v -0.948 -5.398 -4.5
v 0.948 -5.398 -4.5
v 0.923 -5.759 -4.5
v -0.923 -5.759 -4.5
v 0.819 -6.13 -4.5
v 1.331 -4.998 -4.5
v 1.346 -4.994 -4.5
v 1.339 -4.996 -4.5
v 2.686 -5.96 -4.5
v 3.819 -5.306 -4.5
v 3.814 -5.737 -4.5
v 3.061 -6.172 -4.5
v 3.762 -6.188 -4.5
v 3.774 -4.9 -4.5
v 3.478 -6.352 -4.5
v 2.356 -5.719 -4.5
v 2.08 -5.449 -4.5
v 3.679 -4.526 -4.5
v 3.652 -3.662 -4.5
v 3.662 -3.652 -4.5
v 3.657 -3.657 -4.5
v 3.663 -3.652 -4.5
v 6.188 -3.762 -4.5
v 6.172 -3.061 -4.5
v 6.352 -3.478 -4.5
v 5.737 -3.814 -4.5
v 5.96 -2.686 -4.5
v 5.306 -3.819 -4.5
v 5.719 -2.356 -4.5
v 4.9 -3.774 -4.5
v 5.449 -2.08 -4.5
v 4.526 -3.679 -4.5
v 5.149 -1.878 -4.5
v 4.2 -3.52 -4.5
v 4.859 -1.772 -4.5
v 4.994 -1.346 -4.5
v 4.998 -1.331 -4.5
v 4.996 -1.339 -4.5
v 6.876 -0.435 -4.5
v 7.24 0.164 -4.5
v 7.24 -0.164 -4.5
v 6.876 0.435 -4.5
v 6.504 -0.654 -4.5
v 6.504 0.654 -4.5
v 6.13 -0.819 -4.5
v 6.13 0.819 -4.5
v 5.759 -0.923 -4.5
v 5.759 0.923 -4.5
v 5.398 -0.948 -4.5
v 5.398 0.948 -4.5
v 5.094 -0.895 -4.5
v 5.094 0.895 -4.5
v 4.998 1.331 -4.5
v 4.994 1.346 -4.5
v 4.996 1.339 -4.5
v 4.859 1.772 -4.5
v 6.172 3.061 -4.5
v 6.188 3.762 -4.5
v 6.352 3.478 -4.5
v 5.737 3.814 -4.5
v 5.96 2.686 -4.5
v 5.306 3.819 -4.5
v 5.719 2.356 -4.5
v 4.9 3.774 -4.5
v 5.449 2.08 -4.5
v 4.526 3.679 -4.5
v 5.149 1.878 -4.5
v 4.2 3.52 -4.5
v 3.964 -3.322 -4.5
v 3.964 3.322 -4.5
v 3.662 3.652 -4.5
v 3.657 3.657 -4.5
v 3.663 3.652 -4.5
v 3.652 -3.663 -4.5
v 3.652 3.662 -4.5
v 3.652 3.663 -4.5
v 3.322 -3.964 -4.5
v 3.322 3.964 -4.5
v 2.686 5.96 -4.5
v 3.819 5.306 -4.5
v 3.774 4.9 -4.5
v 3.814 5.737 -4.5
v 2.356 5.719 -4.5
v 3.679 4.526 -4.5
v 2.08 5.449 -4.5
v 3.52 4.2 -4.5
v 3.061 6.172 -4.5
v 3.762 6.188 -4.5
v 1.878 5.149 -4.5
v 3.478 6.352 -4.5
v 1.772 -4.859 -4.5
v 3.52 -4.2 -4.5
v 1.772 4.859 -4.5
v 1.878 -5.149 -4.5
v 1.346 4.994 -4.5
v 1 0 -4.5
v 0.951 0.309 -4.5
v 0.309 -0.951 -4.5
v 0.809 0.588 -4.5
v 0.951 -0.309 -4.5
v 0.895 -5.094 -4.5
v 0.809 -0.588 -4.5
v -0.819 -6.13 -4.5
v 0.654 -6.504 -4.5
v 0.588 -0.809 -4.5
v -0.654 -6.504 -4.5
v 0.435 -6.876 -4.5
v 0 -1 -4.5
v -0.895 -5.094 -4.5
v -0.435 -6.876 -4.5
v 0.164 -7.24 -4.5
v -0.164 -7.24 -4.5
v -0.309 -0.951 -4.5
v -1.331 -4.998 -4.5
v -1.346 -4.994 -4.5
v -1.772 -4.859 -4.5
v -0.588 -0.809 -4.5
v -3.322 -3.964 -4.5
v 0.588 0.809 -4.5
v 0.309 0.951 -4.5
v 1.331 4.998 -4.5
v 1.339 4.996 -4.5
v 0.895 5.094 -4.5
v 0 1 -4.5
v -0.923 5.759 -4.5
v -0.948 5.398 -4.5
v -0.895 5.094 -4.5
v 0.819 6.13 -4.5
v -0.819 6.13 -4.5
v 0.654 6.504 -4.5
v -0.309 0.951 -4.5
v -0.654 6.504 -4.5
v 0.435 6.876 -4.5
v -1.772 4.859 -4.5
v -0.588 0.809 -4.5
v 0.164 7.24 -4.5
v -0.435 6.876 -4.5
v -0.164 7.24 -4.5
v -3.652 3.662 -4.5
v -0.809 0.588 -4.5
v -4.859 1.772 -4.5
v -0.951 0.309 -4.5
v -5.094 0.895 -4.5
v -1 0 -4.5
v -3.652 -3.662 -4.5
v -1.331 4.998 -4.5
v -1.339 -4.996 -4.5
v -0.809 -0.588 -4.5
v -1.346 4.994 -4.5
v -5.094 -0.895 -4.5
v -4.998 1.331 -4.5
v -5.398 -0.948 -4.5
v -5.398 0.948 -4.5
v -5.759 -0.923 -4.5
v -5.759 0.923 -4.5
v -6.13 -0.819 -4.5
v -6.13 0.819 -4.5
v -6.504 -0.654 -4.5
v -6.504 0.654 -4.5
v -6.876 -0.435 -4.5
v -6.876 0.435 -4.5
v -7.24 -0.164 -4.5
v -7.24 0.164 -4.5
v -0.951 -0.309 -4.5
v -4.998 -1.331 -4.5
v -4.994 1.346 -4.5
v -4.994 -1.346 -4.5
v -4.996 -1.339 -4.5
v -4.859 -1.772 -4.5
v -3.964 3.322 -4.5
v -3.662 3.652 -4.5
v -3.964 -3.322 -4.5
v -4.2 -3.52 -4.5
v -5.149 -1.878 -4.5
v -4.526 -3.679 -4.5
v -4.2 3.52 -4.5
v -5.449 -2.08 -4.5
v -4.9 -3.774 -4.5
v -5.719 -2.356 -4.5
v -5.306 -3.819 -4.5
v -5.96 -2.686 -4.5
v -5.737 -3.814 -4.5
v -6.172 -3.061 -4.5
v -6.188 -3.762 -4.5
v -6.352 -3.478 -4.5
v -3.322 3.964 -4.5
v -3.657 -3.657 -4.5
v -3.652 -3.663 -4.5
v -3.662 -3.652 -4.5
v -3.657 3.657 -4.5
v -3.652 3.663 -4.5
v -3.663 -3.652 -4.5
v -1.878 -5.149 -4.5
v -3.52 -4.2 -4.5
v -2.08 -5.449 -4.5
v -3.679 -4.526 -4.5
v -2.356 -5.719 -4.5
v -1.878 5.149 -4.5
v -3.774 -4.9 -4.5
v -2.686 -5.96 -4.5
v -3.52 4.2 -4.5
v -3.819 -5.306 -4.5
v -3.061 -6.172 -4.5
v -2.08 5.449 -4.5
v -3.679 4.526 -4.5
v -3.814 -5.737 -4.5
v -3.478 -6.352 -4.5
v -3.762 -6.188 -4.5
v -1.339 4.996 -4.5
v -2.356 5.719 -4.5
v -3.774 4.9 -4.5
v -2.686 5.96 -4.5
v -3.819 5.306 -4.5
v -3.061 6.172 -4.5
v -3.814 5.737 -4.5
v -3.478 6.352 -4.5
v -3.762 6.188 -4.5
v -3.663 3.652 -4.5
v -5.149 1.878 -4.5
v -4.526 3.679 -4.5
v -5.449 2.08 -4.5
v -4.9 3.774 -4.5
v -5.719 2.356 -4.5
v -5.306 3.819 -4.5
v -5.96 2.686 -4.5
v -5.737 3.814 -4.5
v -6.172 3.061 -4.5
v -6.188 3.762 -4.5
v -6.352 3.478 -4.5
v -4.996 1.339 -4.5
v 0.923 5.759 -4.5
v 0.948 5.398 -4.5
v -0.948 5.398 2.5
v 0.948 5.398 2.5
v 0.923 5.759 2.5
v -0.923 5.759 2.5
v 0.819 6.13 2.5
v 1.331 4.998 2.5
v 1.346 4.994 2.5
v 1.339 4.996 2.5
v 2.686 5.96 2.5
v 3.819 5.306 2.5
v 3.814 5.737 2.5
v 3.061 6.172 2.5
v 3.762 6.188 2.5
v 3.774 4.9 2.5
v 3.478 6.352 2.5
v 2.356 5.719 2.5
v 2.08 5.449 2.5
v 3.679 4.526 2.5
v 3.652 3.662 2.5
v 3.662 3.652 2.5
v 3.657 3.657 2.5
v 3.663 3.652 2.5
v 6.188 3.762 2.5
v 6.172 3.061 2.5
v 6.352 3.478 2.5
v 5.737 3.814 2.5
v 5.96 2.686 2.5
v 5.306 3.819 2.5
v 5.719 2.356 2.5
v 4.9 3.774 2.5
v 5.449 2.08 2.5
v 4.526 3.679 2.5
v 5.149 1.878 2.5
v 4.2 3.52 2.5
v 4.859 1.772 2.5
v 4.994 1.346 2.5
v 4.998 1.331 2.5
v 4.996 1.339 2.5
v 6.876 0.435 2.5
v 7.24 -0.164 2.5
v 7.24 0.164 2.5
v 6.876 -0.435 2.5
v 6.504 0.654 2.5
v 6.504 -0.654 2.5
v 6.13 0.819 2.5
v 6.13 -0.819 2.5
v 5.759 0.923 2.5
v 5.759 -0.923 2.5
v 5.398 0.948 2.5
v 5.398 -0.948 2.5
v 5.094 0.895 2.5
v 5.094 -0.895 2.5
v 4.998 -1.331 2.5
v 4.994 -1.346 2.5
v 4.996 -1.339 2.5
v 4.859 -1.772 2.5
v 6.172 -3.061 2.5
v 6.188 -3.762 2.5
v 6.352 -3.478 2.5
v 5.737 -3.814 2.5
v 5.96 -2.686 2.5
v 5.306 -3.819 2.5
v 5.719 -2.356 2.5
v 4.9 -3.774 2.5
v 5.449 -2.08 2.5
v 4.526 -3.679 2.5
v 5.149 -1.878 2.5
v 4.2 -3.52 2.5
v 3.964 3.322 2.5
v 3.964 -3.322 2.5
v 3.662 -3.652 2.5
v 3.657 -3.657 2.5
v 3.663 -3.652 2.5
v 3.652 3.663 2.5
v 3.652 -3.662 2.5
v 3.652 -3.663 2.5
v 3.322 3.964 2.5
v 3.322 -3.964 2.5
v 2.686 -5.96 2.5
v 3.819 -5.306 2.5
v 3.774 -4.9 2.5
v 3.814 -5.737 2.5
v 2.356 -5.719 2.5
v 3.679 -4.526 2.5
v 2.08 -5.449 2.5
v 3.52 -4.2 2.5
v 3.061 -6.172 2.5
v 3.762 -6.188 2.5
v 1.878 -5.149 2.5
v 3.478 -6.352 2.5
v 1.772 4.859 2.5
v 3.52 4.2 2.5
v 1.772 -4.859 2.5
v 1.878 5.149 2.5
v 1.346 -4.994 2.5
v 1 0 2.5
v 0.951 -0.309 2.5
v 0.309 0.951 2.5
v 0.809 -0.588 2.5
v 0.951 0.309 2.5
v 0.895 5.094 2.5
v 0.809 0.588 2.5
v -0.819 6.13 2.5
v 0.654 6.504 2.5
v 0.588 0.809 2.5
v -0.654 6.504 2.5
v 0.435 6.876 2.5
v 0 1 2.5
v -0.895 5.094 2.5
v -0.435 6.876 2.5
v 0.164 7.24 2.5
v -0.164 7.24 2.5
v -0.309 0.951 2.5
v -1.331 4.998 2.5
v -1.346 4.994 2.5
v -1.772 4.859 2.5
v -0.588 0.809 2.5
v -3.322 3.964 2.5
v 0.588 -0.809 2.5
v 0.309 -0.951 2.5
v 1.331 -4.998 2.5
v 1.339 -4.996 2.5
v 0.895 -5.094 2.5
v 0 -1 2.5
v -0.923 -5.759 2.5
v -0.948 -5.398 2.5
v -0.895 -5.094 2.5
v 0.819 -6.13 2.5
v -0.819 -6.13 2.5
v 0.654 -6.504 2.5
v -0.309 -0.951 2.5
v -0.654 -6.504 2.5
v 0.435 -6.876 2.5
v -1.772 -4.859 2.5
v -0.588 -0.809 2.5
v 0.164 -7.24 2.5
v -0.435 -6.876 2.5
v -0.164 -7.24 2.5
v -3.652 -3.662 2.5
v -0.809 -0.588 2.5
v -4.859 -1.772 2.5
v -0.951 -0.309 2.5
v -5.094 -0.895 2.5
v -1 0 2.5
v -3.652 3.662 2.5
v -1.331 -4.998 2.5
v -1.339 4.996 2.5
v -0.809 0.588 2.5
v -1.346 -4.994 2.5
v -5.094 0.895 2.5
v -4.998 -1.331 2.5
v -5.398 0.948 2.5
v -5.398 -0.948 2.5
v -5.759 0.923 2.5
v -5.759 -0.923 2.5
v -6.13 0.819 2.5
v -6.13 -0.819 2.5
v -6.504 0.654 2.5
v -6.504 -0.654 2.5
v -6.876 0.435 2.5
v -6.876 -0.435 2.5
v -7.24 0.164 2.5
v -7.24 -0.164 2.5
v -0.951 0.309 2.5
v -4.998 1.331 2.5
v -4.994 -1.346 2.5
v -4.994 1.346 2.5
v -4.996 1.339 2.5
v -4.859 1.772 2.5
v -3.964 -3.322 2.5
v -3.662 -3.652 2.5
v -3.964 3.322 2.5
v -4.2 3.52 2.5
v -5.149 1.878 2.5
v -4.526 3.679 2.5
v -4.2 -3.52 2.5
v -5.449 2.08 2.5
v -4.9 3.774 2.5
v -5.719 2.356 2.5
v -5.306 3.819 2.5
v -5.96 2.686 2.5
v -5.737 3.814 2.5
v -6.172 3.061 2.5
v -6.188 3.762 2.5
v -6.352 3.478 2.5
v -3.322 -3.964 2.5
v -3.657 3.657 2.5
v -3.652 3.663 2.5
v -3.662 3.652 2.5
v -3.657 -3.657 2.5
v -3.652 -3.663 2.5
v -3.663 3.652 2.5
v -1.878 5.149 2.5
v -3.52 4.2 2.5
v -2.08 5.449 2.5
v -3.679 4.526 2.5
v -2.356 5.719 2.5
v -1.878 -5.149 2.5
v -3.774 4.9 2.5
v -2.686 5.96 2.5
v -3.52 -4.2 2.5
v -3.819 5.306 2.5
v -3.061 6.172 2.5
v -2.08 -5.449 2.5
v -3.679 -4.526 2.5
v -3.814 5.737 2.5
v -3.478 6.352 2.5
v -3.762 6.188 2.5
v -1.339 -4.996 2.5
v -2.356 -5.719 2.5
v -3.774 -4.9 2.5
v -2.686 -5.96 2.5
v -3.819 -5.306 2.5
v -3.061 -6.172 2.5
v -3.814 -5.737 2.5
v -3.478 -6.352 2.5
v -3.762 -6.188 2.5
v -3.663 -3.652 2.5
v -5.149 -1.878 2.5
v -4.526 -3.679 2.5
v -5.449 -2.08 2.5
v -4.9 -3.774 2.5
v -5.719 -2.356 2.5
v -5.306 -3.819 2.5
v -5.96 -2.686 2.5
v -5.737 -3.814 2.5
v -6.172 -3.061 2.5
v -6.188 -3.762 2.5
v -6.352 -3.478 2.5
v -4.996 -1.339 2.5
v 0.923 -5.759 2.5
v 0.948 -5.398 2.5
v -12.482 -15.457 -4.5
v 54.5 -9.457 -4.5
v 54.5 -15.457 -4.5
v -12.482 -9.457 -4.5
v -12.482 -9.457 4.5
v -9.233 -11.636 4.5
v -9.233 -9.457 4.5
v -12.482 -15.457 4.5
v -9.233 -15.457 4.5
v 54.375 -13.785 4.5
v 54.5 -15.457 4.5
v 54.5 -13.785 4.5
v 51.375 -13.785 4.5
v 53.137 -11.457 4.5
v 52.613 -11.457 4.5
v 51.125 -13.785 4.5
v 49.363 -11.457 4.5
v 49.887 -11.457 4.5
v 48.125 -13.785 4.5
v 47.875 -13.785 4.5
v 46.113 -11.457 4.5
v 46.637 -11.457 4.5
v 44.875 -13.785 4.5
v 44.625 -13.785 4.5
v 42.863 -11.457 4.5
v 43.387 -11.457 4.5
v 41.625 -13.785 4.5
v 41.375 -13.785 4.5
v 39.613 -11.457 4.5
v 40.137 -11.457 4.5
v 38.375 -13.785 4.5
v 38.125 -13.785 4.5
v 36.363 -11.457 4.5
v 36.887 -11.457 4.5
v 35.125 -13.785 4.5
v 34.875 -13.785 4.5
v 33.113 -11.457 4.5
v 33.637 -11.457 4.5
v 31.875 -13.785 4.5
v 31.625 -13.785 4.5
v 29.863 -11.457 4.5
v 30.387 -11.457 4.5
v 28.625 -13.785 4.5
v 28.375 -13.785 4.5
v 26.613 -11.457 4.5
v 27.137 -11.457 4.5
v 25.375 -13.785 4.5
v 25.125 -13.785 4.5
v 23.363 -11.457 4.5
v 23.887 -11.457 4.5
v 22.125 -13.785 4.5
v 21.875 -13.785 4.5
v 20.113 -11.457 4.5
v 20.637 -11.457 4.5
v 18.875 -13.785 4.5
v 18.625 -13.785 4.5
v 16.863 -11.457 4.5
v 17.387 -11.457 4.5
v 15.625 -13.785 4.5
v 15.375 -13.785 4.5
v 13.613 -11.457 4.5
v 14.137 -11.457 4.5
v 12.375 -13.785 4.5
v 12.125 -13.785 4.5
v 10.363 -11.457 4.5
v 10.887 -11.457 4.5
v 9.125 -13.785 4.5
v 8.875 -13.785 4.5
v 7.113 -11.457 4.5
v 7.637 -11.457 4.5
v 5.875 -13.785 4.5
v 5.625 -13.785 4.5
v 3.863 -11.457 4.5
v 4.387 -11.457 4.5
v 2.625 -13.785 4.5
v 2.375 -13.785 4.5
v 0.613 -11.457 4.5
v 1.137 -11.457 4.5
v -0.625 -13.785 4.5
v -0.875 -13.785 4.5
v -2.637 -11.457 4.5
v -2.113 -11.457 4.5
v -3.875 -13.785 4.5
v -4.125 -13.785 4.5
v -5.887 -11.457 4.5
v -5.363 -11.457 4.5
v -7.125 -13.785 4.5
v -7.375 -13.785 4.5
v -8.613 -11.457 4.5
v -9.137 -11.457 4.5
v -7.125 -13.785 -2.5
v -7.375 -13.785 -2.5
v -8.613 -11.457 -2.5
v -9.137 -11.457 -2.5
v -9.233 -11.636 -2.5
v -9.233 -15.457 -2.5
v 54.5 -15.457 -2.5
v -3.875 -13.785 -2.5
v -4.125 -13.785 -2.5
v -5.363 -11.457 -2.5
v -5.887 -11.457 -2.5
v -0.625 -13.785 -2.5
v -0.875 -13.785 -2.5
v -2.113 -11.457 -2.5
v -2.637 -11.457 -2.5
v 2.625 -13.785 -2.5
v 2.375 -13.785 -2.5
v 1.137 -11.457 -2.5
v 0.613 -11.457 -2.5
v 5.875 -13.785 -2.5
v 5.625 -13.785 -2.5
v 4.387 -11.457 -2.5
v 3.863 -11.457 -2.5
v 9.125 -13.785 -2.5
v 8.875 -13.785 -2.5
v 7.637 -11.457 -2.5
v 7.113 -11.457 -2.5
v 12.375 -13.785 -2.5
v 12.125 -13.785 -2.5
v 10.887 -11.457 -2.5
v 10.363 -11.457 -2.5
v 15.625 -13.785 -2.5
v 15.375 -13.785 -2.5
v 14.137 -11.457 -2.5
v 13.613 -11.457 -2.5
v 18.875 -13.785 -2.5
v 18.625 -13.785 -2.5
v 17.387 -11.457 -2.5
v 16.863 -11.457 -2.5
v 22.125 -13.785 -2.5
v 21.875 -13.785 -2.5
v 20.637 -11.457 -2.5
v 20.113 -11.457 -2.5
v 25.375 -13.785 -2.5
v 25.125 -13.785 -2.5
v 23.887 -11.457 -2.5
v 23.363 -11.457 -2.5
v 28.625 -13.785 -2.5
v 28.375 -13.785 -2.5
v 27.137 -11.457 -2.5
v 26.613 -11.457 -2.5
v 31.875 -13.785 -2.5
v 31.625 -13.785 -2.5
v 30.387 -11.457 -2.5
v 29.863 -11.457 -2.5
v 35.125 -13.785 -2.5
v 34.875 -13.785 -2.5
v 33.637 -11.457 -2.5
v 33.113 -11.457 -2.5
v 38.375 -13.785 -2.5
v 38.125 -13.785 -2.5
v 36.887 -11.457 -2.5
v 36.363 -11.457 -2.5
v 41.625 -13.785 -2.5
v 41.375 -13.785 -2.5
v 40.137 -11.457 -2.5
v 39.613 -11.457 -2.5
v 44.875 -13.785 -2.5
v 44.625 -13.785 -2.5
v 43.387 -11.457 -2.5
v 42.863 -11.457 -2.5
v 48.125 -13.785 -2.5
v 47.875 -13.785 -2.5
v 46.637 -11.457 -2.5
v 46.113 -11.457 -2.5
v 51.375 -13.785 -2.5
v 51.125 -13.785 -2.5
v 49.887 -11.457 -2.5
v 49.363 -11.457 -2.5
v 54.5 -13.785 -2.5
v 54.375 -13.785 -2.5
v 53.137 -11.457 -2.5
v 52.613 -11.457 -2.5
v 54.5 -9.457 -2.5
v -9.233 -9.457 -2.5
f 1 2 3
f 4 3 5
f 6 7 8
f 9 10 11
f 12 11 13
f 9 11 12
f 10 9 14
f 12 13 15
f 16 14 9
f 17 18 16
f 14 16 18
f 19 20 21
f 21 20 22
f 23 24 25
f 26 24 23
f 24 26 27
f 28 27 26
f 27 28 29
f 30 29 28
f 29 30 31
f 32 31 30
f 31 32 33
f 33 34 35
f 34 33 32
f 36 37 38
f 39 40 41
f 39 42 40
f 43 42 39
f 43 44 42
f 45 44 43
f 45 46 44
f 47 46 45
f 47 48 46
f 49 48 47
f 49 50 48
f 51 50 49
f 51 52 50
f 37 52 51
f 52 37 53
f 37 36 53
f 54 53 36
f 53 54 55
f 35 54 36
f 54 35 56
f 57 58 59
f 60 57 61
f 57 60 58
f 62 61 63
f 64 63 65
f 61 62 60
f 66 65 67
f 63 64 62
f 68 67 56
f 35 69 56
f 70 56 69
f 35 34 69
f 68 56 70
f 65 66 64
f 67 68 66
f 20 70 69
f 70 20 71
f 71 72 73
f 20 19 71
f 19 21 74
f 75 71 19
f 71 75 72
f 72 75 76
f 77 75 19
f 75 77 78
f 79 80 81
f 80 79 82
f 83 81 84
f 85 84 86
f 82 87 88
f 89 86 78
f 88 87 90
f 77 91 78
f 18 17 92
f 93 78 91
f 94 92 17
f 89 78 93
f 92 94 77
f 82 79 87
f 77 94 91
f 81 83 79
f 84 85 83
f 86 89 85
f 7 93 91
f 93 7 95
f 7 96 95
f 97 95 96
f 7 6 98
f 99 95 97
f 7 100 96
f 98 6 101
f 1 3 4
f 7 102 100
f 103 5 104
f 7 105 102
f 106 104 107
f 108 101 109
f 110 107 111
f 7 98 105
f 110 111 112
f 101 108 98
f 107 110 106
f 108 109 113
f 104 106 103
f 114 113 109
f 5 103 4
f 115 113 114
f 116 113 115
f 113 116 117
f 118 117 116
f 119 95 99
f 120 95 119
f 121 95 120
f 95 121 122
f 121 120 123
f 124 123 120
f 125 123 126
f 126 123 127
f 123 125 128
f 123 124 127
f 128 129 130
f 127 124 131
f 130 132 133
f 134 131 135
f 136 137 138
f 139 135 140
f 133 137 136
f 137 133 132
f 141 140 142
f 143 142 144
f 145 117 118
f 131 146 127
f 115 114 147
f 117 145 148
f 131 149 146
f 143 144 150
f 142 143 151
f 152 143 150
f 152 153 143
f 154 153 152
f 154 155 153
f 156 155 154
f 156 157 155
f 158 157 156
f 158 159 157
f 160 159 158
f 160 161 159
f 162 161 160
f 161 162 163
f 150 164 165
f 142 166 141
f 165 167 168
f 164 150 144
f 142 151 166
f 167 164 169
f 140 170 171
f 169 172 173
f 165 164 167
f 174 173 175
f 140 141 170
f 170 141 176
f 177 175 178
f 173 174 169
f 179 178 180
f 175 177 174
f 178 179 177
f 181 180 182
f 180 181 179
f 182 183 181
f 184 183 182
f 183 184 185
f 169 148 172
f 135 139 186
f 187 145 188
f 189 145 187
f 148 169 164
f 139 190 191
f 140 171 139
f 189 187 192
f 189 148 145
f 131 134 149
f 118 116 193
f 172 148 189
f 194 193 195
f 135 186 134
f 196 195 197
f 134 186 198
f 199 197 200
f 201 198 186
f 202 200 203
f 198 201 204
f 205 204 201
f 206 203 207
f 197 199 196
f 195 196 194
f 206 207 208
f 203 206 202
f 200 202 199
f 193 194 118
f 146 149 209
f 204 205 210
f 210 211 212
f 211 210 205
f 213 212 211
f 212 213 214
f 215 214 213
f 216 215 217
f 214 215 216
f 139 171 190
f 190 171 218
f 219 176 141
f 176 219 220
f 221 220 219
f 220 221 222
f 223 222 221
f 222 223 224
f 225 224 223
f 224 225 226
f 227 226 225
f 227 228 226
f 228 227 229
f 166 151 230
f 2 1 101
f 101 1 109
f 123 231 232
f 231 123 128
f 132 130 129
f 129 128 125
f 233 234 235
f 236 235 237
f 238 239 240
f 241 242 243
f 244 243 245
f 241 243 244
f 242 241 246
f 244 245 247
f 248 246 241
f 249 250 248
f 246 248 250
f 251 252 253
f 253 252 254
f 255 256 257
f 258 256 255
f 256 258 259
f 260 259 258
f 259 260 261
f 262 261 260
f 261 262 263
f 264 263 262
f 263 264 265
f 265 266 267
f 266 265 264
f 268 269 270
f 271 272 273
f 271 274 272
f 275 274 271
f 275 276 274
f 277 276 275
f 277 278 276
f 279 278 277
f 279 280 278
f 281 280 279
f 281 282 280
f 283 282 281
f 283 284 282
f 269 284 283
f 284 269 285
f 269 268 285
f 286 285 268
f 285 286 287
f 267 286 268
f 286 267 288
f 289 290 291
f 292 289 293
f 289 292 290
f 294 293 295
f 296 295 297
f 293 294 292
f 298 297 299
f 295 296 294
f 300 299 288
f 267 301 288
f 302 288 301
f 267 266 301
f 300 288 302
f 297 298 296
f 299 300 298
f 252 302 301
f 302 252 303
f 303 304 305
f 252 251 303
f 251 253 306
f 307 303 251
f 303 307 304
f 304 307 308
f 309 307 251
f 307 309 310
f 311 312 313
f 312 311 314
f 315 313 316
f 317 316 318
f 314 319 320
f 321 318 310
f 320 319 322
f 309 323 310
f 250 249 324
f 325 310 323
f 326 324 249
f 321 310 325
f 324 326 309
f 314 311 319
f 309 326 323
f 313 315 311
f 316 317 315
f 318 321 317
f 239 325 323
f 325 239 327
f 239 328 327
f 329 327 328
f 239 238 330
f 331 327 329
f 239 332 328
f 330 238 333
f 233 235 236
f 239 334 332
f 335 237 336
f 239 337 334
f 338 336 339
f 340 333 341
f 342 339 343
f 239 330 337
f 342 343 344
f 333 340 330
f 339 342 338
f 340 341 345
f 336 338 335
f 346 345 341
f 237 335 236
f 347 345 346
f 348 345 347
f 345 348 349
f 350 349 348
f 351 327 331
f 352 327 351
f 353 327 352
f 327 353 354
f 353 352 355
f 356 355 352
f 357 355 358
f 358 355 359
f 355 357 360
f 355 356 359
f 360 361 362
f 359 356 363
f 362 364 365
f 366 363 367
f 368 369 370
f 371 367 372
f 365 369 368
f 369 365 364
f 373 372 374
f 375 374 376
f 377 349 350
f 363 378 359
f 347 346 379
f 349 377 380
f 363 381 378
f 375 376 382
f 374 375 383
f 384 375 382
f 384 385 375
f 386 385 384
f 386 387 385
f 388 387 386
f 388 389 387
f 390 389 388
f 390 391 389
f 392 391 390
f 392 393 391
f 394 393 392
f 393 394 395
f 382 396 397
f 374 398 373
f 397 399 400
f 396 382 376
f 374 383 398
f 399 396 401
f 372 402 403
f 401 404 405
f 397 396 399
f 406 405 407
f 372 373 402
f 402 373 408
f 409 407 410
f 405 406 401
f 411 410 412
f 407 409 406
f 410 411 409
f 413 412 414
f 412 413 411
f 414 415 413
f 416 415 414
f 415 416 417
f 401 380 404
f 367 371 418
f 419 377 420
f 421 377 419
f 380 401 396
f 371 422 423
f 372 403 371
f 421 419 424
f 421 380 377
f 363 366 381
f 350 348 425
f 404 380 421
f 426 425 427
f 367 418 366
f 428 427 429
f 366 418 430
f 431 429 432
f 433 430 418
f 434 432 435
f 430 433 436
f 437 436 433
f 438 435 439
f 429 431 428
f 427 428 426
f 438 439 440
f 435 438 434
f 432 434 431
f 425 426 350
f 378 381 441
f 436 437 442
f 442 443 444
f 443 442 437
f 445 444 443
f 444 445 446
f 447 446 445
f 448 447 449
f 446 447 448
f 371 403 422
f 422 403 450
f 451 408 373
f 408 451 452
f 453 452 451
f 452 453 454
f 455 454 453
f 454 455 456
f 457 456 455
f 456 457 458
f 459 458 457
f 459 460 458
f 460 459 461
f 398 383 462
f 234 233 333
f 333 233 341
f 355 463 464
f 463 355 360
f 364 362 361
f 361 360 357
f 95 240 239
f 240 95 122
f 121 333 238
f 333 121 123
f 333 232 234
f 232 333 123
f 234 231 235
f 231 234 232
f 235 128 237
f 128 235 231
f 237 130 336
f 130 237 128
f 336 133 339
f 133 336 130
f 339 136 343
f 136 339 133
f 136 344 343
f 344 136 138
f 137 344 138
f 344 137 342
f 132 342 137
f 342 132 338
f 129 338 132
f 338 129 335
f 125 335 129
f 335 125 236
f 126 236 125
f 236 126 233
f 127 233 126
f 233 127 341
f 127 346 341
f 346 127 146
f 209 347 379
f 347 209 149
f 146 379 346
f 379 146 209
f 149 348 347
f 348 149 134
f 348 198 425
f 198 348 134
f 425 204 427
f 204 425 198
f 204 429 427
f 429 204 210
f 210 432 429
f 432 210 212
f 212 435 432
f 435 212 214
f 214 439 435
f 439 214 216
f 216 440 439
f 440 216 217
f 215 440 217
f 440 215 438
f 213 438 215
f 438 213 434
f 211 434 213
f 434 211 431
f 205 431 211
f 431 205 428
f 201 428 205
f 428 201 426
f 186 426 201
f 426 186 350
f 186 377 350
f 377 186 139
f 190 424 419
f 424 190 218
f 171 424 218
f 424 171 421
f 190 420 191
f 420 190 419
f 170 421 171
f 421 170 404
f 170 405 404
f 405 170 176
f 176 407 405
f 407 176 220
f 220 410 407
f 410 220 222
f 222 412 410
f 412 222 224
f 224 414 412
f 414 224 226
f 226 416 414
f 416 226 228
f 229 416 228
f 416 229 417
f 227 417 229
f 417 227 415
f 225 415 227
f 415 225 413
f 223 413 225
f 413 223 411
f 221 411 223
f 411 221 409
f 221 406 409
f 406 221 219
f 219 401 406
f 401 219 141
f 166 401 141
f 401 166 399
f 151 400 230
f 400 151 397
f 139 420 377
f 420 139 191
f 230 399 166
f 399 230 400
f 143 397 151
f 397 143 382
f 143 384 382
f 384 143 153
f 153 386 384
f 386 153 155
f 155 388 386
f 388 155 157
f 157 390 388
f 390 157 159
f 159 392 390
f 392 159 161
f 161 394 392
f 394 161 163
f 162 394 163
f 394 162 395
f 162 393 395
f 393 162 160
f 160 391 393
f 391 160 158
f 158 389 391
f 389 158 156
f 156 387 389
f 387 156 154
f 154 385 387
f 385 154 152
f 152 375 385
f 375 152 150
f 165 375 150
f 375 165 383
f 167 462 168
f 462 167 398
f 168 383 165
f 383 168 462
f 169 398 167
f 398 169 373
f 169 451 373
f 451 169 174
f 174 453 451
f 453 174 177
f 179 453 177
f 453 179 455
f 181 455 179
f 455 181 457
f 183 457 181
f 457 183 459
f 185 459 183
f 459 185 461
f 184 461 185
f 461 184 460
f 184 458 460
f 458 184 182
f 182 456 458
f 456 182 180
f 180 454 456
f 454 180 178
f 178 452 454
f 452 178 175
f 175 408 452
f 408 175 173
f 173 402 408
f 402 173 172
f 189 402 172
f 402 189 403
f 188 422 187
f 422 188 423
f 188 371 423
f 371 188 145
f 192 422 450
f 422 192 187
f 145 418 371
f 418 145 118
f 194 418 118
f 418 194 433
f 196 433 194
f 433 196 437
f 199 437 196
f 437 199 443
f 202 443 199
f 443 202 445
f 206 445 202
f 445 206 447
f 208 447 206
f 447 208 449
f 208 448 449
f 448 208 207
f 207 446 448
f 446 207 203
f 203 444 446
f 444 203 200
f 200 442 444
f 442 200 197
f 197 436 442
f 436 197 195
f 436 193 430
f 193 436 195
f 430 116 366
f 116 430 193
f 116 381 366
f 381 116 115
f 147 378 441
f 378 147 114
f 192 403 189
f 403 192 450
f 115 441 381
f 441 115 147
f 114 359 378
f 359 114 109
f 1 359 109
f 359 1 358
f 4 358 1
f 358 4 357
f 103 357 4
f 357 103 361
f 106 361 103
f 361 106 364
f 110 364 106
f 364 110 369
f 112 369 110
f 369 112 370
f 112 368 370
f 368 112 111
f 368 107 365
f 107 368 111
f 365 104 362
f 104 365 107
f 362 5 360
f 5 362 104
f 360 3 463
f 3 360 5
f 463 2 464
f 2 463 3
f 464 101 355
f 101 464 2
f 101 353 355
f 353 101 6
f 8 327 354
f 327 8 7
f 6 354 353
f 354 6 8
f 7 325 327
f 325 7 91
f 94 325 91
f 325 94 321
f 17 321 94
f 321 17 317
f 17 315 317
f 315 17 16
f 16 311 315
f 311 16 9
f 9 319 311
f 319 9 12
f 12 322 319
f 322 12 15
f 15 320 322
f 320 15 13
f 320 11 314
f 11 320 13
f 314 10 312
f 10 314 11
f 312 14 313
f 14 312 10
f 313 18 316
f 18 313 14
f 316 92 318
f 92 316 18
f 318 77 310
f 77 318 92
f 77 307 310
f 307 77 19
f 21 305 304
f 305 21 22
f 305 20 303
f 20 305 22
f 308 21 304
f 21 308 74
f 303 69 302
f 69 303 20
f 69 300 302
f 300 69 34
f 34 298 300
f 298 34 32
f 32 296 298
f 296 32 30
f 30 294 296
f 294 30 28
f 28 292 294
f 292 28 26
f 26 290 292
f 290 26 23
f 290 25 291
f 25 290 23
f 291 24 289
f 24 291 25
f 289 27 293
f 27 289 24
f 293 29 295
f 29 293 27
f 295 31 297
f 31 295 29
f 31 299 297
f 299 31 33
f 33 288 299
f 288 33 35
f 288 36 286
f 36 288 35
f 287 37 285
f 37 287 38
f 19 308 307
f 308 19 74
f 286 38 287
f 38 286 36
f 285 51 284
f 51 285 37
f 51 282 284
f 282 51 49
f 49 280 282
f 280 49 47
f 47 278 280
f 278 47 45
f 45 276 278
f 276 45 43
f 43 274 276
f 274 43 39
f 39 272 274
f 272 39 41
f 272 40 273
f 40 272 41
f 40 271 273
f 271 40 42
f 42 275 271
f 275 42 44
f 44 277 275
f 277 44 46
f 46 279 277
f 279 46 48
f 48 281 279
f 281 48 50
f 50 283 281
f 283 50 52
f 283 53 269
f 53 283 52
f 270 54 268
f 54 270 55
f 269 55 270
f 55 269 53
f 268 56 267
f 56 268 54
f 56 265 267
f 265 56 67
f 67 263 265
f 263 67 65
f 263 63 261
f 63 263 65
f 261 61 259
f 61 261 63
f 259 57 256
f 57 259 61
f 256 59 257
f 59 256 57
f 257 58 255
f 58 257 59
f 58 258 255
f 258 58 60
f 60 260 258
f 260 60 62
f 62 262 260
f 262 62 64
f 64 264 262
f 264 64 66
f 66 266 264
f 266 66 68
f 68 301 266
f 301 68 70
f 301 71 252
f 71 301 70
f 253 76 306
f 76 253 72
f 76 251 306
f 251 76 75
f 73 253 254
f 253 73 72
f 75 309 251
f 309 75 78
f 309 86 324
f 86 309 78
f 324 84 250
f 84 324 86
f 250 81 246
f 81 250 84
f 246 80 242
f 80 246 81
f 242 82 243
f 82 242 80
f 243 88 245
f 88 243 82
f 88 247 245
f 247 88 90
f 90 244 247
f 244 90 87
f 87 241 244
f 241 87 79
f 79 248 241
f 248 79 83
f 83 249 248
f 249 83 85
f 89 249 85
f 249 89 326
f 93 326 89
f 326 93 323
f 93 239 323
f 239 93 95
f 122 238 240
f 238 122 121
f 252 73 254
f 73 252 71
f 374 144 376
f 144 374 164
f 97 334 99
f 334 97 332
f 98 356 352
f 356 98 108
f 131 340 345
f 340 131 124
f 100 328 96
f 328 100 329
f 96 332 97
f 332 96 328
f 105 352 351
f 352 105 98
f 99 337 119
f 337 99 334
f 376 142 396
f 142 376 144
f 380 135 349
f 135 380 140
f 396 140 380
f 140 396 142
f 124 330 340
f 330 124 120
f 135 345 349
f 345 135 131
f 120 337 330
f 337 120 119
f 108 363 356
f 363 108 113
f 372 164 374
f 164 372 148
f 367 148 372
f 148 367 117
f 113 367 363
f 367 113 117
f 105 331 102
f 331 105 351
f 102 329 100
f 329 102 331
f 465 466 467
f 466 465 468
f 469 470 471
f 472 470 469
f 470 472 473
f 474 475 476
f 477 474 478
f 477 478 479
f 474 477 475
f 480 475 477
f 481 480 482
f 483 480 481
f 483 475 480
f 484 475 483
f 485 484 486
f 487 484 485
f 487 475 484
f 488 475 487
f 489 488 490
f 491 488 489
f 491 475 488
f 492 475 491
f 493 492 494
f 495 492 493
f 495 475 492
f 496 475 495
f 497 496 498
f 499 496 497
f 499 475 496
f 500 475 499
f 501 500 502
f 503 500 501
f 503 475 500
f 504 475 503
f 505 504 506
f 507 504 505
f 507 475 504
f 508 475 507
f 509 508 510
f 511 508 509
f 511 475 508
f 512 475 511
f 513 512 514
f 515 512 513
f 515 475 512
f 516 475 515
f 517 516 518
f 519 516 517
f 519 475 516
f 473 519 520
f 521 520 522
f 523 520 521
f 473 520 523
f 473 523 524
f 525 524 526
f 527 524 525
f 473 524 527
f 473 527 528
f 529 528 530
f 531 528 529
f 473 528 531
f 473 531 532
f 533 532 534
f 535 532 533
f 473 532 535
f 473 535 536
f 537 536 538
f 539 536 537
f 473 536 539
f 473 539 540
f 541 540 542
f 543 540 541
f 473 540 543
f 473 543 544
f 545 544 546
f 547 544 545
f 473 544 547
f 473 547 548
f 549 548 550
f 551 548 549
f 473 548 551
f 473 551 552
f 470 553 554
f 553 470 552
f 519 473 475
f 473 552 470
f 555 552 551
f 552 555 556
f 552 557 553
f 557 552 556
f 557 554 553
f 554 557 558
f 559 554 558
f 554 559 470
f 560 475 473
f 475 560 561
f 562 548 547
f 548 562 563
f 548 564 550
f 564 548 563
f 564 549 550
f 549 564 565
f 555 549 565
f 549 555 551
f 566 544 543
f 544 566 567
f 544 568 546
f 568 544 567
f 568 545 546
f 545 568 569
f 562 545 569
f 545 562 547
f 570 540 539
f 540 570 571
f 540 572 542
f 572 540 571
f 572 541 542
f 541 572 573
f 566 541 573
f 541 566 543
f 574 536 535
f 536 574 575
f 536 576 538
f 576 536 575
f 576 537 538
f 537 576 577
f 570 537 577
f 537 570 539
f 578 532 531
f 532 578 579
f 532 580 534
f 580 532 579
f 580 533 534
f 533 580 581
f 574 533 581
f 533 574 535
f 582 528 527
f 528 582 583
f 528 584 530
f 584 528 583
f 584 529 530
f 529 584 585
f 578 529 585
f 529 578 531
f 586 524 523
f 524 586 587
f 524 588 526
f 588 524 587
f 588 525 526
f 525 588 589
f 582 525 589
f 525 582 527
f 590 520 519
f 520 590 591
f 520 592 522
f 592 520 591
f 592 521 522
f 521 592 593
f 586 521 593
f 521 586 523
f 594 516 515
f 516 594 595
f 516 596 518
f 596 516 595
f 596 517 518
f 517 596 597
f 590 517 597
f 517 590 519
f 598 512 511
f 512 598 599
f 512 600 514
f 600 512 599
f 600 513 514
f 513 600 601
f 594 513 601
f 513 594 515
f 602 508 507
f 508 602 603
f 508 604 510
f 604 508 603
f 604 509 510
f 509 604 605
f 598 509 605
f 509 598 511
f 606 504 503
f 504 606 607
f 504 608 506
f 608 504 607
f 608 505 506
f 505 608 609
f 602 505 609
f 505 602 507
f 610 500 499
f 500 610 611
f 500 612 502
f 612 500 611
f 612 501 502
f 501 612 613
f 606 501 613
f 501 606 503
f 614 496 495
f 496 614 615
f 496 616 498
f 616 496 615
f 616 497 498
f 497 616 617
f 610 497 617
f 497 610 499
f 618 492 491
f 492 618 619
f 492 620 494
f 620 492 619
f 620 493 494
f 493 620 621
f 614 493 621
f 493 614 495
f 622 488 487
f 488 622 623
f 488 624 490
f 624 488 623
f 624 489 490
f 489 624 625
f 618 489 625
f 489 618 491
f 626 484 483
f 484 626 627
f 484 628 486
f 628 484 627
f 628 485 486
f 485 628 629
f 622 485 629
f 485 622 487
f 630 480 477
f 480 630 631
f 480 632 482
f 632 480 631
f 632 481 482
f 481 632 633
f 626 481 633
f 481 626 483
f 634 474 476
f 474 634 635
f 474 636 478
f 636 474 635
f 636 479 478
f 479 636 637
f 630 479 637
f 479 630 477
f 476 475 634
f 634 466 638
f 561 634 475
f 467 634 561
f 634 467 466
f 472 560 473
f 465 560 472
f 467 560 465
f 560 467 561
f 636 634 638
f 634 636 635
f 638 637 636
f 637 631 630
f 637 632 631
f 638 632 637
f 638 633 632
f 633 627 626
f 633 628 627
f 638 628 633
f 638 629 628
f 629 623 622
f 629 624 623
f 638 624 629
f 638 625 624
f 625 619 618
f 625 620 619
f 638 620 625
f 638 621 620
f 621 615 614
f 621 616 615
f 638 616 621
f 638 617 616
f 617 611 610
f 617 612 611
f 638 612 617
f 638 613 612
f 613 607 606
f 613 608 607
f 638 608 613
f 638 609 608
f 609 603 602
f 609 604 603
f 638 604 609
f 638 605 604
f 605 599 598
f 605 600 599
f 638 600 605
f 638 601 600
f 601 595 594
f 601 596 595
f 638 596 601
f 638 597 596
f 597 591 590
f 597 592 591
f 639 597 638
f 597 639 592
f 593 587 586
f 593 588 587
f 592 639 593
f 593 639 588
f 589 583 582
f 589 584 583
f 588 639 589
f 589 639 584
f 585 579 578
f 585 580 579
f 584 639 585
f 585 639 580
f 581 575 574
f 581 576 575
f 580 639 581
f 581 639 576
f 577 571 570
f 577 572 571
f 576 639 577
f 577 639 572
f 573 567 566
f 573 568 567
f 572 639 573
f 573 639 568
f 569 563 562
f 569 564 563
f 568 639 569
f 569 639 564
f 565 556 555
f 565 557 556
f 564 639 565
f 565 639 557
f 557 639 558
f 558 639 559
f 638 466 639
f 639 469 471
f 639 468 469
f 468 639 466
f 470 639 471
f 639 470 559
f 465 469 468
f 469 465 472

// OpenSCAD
//This is a modification of " Public Domain Parametric Involute Spur Gear (and involute helical gear and involute rack)
// by Leemon Baird, 2011, Leemon@Leemon.com
//http://www.thingiverse.com/thing:5505  "

//Modifications by racatack June 2016:
// v1.0, 6/24/16:
//  -Incorporated 'module InvoluteGear_rack()' from the 11/11/15 comment by quisam2342 in thing:5505 to fix noted problems in rack generation at various tooth sizes
//  -Added a section for an optional 'backboard' that can be used to stiffen an otherwise skinny rack
//  -Added sections for optional Stop Blocks at either or both ends of a rack
//  -Removed extra gears from the example since I only need one pinion. See thing:5505 example section to gain more insight into gear generation.
//v1.1, 6/28/16:
//  -Added sections to optionally create mounting flanges on the bottom/backside of the rack. Flanges can be at either or both ends, or longitudinal.
//v1.1.1, 2/26/2024
//  -Added line 221 for generation of a pinion with no rack. Previously, if zero rack teeth was input, 2 teeth were generated anyway, because loops and math and stuff.

//TO GENERATE A CUSTOM RACK AND PINION ENTER INPUTS AT LINES 345-380


//////////////////////////////////////////////////////////////////////////////////////////////
// Public Domain Parametric Involute Spur Gear (and involute helical gear and involute rack)
// version 1.1
// by Leemon Baird, 2011, Leemon@Leemon.com
//http://www.thingiverse.com/thing:5505
//
// This file is public domain.  Use it for any purpose, including commercial
// applications.  Attribution would be nice, but is not required.  There is
// no warranty of any kind, including its correctness, usefulness, or safety.
//
// This is parameterized involute spur (or helical) gear.  It is much simpler and less powerful than
// others on Thingiverse.  But it is public domain.  I implemented it from scratch from the
// descriptions and equations on Wikipedia and the web, using Mathematica for calculations and testing,
// and I now release it into the public domain.
//
//		http://en.wikipedia.org/wiki/Involute_gear
//		http://en.wikipedia.org/wiki/Gear
//		http://en.wikipedia.org/wiki/List_of_gear_nomenclature
//		http://gtrebaol.free.fr/doc/catia/spur_gear.html
//		http://www.cs.cmu.edu/~rapidproto/mechanisms/chpt7.html
//
// The module gear() gives an involute spur gear, with reasonable defaults for all the parameters.
// Normally, you should just choose the first 4 parameters, and let the rest be default values.
// The module gear() gives a gear in the XY plane, centered on the origin, with one tooth centered on
// the positive Y axis.  The various functions below it take the same parameters, and return various
// measurements for the gear.  The most important is pitch_radius, which tells how far apart to space
// gears that are meshing, and adendum_radius, which gives the size of the region filled by the gear.
// A gear has a "pitch circle", which is an invisible circle that cuts through the middle of each
// tooth (though not the exact center). In order for two gears to mesh, their pitch circles should
// just touch.  So the distance between their centers should be pitch_radius() for one, plus pitch_radius()
// for the other, which gives the radii of their pitch circles.
//
// In order for two gears to mesh, they must have the same mm_per_tooth and pressure_angle parameters.
// mm_per_tooth gives the number of millimeters of arc around the pitch circle covered by one tooth and one
// space between teeth.  The pitch angle controls how flat or bulged the sides of the teeth are.  Common
// values include 14.5 degrees and 20 degrees, and occasionally 25.  Though I've seen 28 recommended for
// plastic gears. Larger numbers bulge out more, giving stronger teeth, so 28 degrees is the default here.
//
// The ratio of number_of_teeth for two meshing gears gives how many times one will make a full
// revolution when the the other makes one full revolution.  If the two numbers are coprime (i.e.
// are not both divisible by the same number greater than 1), then every tooth on one gear
// will meet every tooth on the other, for more even wear.  So coprime numbers of teeth are good.
//
// The module rack() gives a rack, which is a bar with teeth.  A rack can mesh with any
// gear that has the same mm_per_tooth and pressure_angle.
//
// Some terminology:
// The outline of a gear is a smooth circle (the "pitch circle") which has mountains and valleys
// added so it is toothed.  So there is an inner circle (the "root circle") that touches the
// base of all the teeth, an outer circle that touches the tips of all the teeth,
// and the invisible pitch circle in between them.  There is also a "base circle", which can be smaller than
// all three of the others, which controls the shape of the teeth.  The side of each tooth lies on the path
// that the end of a string would follow if it were wrapped tightly around the base circle, then slowly unwound.
// That shape is an "involute", which gives this type of gear its name.
//
//////////////////////////////////////////////////////////////////////////////////////////////

//An involute spur gear, with reasonable defaults for all the parameters.
//Normally, you should just choose the first 4 parameters, and let the rest be default values.
//Meshing gears must match in mm_per_tooth, pressure_angle, and twist,
//and be separated by the sum of their pitch radii, which can be found with pitch_radius().
module gear (
        mm_per_tooth    = 3,    //this is the "circular pitch", the circumference of the pitch circle divided by the number of teeth
        number_of_teeth = 11,   //total number of teeth around the entire perimeter
        thickness       = 6,    //thickness of gear in mm
        hole_diameter   = 3,    //diameter of the hole in the center, in mm
        twist           = 0,    //teeth rotate this many degrees from bottom of gear to top.  360 makes the gear a screw with each thread going around once
        teeth_to_hide   = 0,    //number of teeth to delete to make this only a fraction of a circle
        pressure_angle  = 28,   //Controls how straight or bulged the tooth sides are. In degrees.
        clearance       = 0.0,  //gap between top of a tooth on one gear and bottom of valley on a meshing gear (in millimeters)
        backlash        = 0.0   //gap between two meshing teeth, in the direction along the circumference of the pitch circle
    )
{
assign(pi = 3.1415926)
assign(p  = mm_per_tooth * number_of_teeth / pi / 2)  //radius of pitch circle
assign(c  = p + mm_per_tooth / pi - clearance)        //radius of outer circle
assign(b  = p*cos(pressure_angle))                    //radius of base circle
assign(r  = p-(c-p)-clearance)                        //radius of root circle
assign(t  = mm_per_tooth/2-backlash/2)                //tooth thickness at pitch circle
assign(k  = -iang(b, p) - t/2/p/pi*180)               //angle to where involute meets base circle on each side of tooth
{
    difference()
    {
        for (i = [0:number_of_teeth-teeth_to_hide-1] )
            rotate([0,0,i*360/number_of_teeth])
            linear_extrude(height = thickness, center = true, convexity = 10, twist = twist)
            polygon(
                points=[
                           [0, -hole_diameter/10],
                           polar(r, -181/number_of_teeth),
                           polar(r, r<b ? k : -180/number_of_teeth),
                           q7(0/5,r,b,c,k, 1),q7(1/5,r,b,c,k, 1),q7(2/5,r,b,c,k, 1),q7(3/5,r,b,c,k, 1),q7(4/5,r,b,c,k, 1),q7(5/5,r,b,c,k, 1),
                           q7(5/5,r,b,c,k,-1),q7(4/5,r,b,c,k,-1),q7(3/5,r,b,c,k,-1),q7(2/5,r,b,c,k,-1),q7(1/5,r,b,c,k,-1),q7(0/5,r,b,c,k,-1),
                           polar(r, r<b ? -k : 180/number_of_teeth),
                           polar(r, 181/number_of_teeth)
                       ],
                paths=[[0,1,2,3,4,5,6,7,8,9,10,11,12,13,14,15,16]]
            );
        cylinder(h=2*thickness+1, r=hole_diameter/2, center=true, $fn=20);
    }
}
};
//these 4 functions are used by gear
function polar(r,theta)   = r*[sin(theta), cos(theta)];                            //convert polar to cartesian coordinates
function iang(r1,r2)      = sqrt((r2/r1)*(r2/r1) - 1)/3.1415926*180 - acos(r1/r2); //unwind a string this many degrees to go from radius r1 to radius r2
function q7(f,r,b,r2,t,s) = q6(b,s,t,(1-f)*max(b,r)+f*r2);                         //radius a fraction f up the curved side of the tooth
function q6(b,s,t,d)      = polar(d,s*(iang(b,d)+t));                              //point at radius d on the involute curve

//a rack, which is a straight line with teeth (the same as a segment from a giant gear with a huge number of teeth).
//The "pitch circle" is a line along the X axis.
//module rack (
//	mm_per_tooth    = 3,    //this is the "circular pitch", the circumference of the pitch circle divided by the number //of teeth
//	number_of_teeth = 11,   //total number of teeth along the rack
//	thickness       = 6,    //thickness of rack in mm (affects each tooth)
//	height          = 120,   //height of rack in mm, from tooth top to far side of rack.
//	pressure_angle  = 28,   //Controls how straight or bulged the tooth sides are. In degrees.
//	backlash        = 0.0   //gap between two meshing teeth, in the direction along the circumference of the pitch circle
//) {
//	assign(pi = 3.1415926)
//	assign(a = mm_per_tooth / pi) //addendum
//	assign(t = a*cos(pressure_angle)-1)         //tooth side is tilted so top/bottom corners move this amount
//		for (i = [0:number_of_teeth-1] )
//			translate([i*mm_per_tooth,0,0])
//				linear_extrude(height = thickness, center = true, convexity = 10)
//					polygon(
//						points=[
//							[-mm_per_tooth * 3/4,                 a-height],
//							[-mm_per_tooth * 3/4 - backlash,     -a],
//							[-mm_per_tooth * 1/4 + backlash - t, -a],
//							[-mm_per_tooth * 1/4 + backlash + t,  a],
//							[ mm_per_tooth * 1/4 - backlash - t,  a],
//							[ mm_per_tooth * 1/4 - backlash + t, -a],
//							[ mm_per_tooth * 3/4 + backlash,     -a],
//							[ mm_per_tooth * 3/4,                 a-height],
//						],
//						paths=[[0,1,2,3,4,5,6,7]]
//					);
//};


//rac note - This section generates the rack body and teeth. It is from the 11/11/15 comment by quisam2342 in thing:5505 to fix noted problems with rack generation, and replaces the original 'module rack()'
////////////////////////////////////////////////////////////////////////////////////////////////
// The module InvoluteGear_rack() gives a involute gear rack, which is a bar with teeth.
// A rack can mesh with any gear that has the same mm_per_tooth and pressure_angle.
// The "pitch circle" is a line along the X axis.
//
// mm_per_tooth     this is the "circular pitch", the circumference of the pitch circle
//                  divided by the number of teeth
//
// number_of_teeth  total number of teeth along the rack
//
// thickness        thickness of rack in mm
//
// height           height of rack in mm, from tooth top to far side of rack
//
// pressure_angle   controls how straight or bulged the tooth sides are, in degrees
//
// clearance        gap between top of a tooth on one gear and bottom of valley
//                  on a meshing gear, in millimeters
//
// backlash         gap between two meshing teeth, in the direction along the circumference
//                  of the pitch circle
////////////////////////////////////////////////////////////////////////////////////////////////



module InvoluteGear_rack (

        //Default numbers in this section get overridden by numbers in 'example rack and pinion' section, so set your values there.

        mm_per_tooth    = 3, //all meshing gears need the same mm_per_tooth
        number_of_teeth = 11,
        thickness       = 6,
        height          = 4,

        //rac - Added variables for backboard, stop blocks and mounting flanges:
//set your values in the 'example rack and pinion' section, as defaults given here will be overridden by that section
        backboard_thickness = 2.0,
        backboard_height = 1.0,
        side_flange_thickness = 0,
        side_flange_height = 0,
        flange_offset = 0,
        stop_height = backboard_height,
        left_stop_enable = 1,
        right_stop_enable = 1,
        flange_height = 0,
        left_flange_enable = 1,
        right_flange_enable = 1,

//These defaults are not redefined in the example section:
        pressure_angle  = 28,  //all meshing gears need the same pressure_angle
        clearance       = 0.0,
        backlash        = 0.0

    )

{
// addendum - tooth height above pitch line
assign(addendum =        module_value(mm_per_tooth) - clearance)

// dedendum - tooth height below pitch line
assign(dedendum = 1.25 * module_value(mm_per_tooth)            )


for (i = [0:number_of_teeth-1] )
    if (number_of_teeth > 0)
        translate([(i+0.5)*mm_per_tooth,height-addendum,0])
        linear_extrude(height = thickness, center = true, convexity = 10)  //'height' parameter here is not the same as 'height' parameter of module. Here it effectively is the width or thickness as the rack is extruded from one side-face to the other.
        polygon(
            points=[
                       [-1/2 * mm_per_tooth,                                              addendum-height],
                       [-1/2 * mm_per_tooth,                                             -dedendum],
                       [-1/4 * mm_per_tooth + backlash - dedendum * tan(pressure_angle), -dedendum],
                       [-1/4 * mm_per_tooth + backlash + addendum * tan(pressure_angle),  addendum],
                       [ 1/4 * mm_per_tooth - backlash - addendum * tan(pressure_angle),  addendum],
                       [ 1/4 * mm_per_tooth - backlash + dedendum * tan(pressure_angle), -dedendum],
                       [ 1/2 * mm_per_tooth,                                             -dedendum],
                       [ 1/2 * mm_per_tooth,                                              addendum-height],
                   ],
            paths=[[0,1,2,3,4,5,6,7]]
        );

//rac -added - This section optionally creates a 'stop block' at the left end of the rack
translate([(-0.11)*mm_per_tooth,0,0.5*(-thickness)])
linear_extrude(height = left_stop_enable*thickness, center = false, convexity = 10)
polygon(
    points=[
               [-1/2 * mm_per_tooth,height+stop_height],   //stop_height extends stop block above teeth, change the number to change the extension amount
               [-1/2 * mm_per_tooth,0],
               [ 1/2 * mm_per_tooth,0],
               [ 1/2 * mm_per_tooth,height+stop_height],   //stop_height extends stop block above teeth, change the number to change the extension amount
            ],
    paths=[[0,1,2,3]]
);


//rac -added - This section optionally creates a 'stop block' at the right end of the rack
translate([(0.11+number_of_teeth)*mm_per_tooth,0,0.5*(-thickness)])
linear_extrude(height = right_stop_enable*thickness, center = false, convexity = 10)
polygon(
    points=[
               [-1/2 * mm_per_tooth,height+stop_height],   //stop_height extends stop block above teeth
               [-1/2 * mm_per_tooth,0],
               [ 1/2 * mm_per_tooth,0],
               [ 1/2 * mm_per_tooth,height+stop_height],   //stop_height extends stop block above teeth
            ],
    paths=[[0,1,2,3]]
);


//rac -added - This section optionally creates a flange at the left rear of the rack
translate([(-0.11)*mm_per_tooth,0,0.5*(-thickness)])
linear_extrude(height = left_flange_enable*thickness, center = false, convexity = 10)
polygon(
    points=[
               [-1/2 * mm_per_tooth,-flange_height],   //flange_height extends flange beyond rack bottom
               [-1/2 * mm_per_tooth,0],
               [ 1/2 * mm_per_tooth,0],
               [ 1/2 * mm_per_tooth,-flange_height],   //flange_height extends flange beyond rack bottom
            ],
    paths=[[0,1,2,3]]
);



//rac -added - This section optionally creates a flange at the right rear of the rack
translate([(0.11+number_of_teeth)*mm_per_tooth,0,0.5*(-thickness)])
linear_extrude(height = right_flange_enable*thickness, center = false, convexity = 10)
polygon(
    points=[
               [-1/2 * mm_per_tooth,-flange_height],   //flange_height extends flange beyond rack bottom
               [-1/2 * mm_per_tooth,0],
               [ 1/2 * mm_per_tooth,0],
               [ 1/2 * mm_per_tooth,-flange_height],   //flange_height extends flange beyond rack bottom
            ],
    paths=[[0,1,2,3]]
);



//rac -added - This section optionally creates a 'Backboard' on one side of the rack. Can be used to add stiffness for a 'thin' rack (i.e. a rack with low height and/or thickness numbers) or if a large negative height is used it can extend under the rack as a mounting flange.
for (i = [0:number_of_teeth-1] )
    translate([(i+0.5)*mm_per_tooth,0,0.5*(-thickness+backboard_thickness)])
    //0.5*(-thickness+backboard_thickness) starts the backboard at one side of the rack and extrudes it inward
    linear_extrude(height = backboard_thickness, center = true, convexity = 10)
    polygon(
        points=[
                   [-1/2 * mm_per_tooth,height+backboard_height],   //backboard_height extends backboard above teeth
                   [-1/2 * mm_per_tooth,0],

                   [ 1/2 * mm_per_tooth,0],
                   [ 1/2 * mm_per_tooth,height+backboard_height],   //backboard_height extends backboard above teeth
               ],
        paths=[[0,1,2,3]]
    );


//rac -added - This section optionally creates a Rear Side-Flange on along one side of the rack. Can be used to add stiffness for a 'thin' rack (i.e. a rack with low height and/or thickness numbers) or it can be used as a mounting flange.
for (i = [0:number_of_teeth-1] )
    translate([(i+0.5)*mm_per_tooth,0,0.5*(-thickness+side_flange_thickness)+flange_offset])
    //0.5*(-side_flange_thickness) starts the backboard at one side of the rack and extrudes it inward. flange_offset moves the flange toward the other side of the rack
    linear_extrude(height = side_flange_thickness, center = true, convexity = 10)
    polygon(
        points=[
                   [-1/2 * mm_per_tooth,-side_flange_height],   //side_flange_height extends side_flange beyond rack bottom
                   [-1/2 * mm_per_tooth,0],

                   [ 1/2 * mm_per_tooth,0],
                   [ 1/2 * mm_per_tooth,-side_flange_height],   //side_flange_height extends backboard beyond rack bottom
               ],
        paths=[[0,1,2,3]]
    );

}


//These 5 functions let the user find the derived dimensions of the gear.
//A gear fits within a circle of radius outer_radius, and two gears should have
//their centers separated by the sum of their pictch_radius.
function circular_pitch  (mm_per_tooth=3) = mm_per_tooth;                     //tooth density expressed as "circular pitch" in millimeters
function diametral_pitch (mm_per_tooth=3) = 3.1415926 / mm_per_tooth;         //tooth density expressed as "diametral pitch" in teeth per millimeter
function module_value    (mm_per_tooth=3) = mm_per_tooth / 3.1415926;                //tooth density expressed as "module" or "modulus" in millimeters
function pitch_radius    (mm_per_tooth=3,number_of_teeth=11) = mm_per_tooth * number_of_teeth / 3.1415926 / 2;
function outer_radius    (mm_per_tooth=3,number_of_teeth=11,clearance=0.1)    //The gear fits entirely within a cylinder of this radius.
    = mm_per_tooth*(1+number_of_teeth/2)/3.1415926  - clearance;





//////////////////////////////////////////////////////////////////////////////////////////////

//GENERATE A RACK AND PINION
//ENTER YOUR VALUES HERE: (not in defaults of InvoluteGear_rack() or gear() modules)

//The variable names can be confusing - experiment! Change something then click the dotted cube with Fast-Forward arrows.

//example rack and pinion:
//all distances in mm
n1 = 12; //red gear number of teeth. Set to zero if you don't want to generate a pinion.
n5 = 20;  //gray rack number of teeth.  Set to 0 if you don't want to generate a rack. (For no rack also set Backboard and Side Flange thicknesses to 0, and disable End Stops and End Flanges below or they will generate a blob next to the pinion.)
mm_per_tooth = 3.25;
thickness    = 9;  // depth of the rack from side-to-side, including backboard if any. The pinion will be this depth minus the backboard_thickness
hole         = 2;   //hole diameter in pinion gear
height       = 4;  // distance from bottom of the rack to the tips of the teeth

//rac-Added - Set your values here for  a Backboard along one side of the teeth.
backboard_thickness = 2; //set to zero for no backboard
backboard_height = 2;   //set to zero for top of backboard to be even with tips of teeth, a positive number will extend above the teeth by the chosen amount. Negative number will place the top of the backboard lower than the teeth.

//rac-Added - Set your values here for a rear Side-Flange along one side of the teeth extending to the rear of the rack (opposite the direction of a backboard).
side_flange_thickness = 0; //set to zero for no rear Side-Flange
side_flange_height = 6; // A positive number extends the side-flange beyond the bottom of the rack the by specified amount.
flange_offset = 0; //Set to zero for a flange running coplanar with one side of the teeth. A positive number moves the flange toward other side of the teeth

//rac-Added - Set your values here for Stop Blocks at one or both ends.
stop_height = 2; //Stop Blocks will extend this much above the teeth. A positive number will extend above the teeth by the chosen amount. Negative number will place the top of the block lower than the teeth.
left_stop_enable = 1;  //set to 1 to generate Left Stop Block, set to 0 to disable
right_stop_enable = 0;  //set to 1 to generate Right Stop Block, set to 0 to disable

//rac-Added - Set your values here for rear End-Flanges at one or both ends.
flange_height = 8; //Flanges will extend this much from the bottom of the rack. ****Combine with 0 height Stop Blocks to effectively start flanges at top of tooth instead of backside.****
left_flange_enable = 0;  //set to 1 to generate Left Rear Flange, set to 0 to disable.
right_flange_enable = 0;  //set to 1 to generate Right Rear Flange, set to 0 to disable.
//end of inputs -------------------------------------------------------

d1 =pitch_radius(mm_per_tooth,n1);

//Generation of pinion gear:
translate([ 0,    0, -.5*backboard_thickness]) rotate([0,0, $t*360/n1])                 color([1.00,0.75,0.75]) gear(mm_per_tooth,n1,(thickness-backboard_thickness),hole); //rac -RE above: 'thickness-backboard_thickness' is used here to reduce gear thickness for backboard on rack, The '-.5*backboard_thickness' in translate puts gear bottom even with rack bottom

//Generation of rack, and Relative positioning of gear and rack:
translate([(-floor(n5/2)-floor(n1/2)+$t+n1/2-1/2), -height-backboard_height-d1-mm_per_tooth, 0]) rotate([0,0,0]) color([0.75,0.75,0.75]) InvoluteGear_rack(mm_per_tooth,n5,thickness,height,backboard_thickness,backboard_height,side_flange_thickness,side_flange_height,flange_offset,stop_height,left_stop_enable,right_stop_enable,flange_height,left_flange_enable,right_flange_enable);   //rac - In the above 'translate' instruction, the middle parameter sets spacing between the rack and the pinion. I've set it to '-height-backboard_height-d1-mm_per_tooth' to give a proportionate offset that allows for ease of printing for most sets of gear & rack parameters. If you use a large NEGATIVE backboard height THE GEAR AND RACK MAY OVERLAP. That can be fixed by substituting some other number/formula for '-height-backboard_height-d1-mm_per_tooth'. Try for example -3*d1, or just subtract an additional fixed offset from what's in there now (e.g. (-height-backboard_height-d1-mm_per_tooth)-14.)

//end of example rack and pinion
//////////////////////////////////////////////////////////////////////////////////////////////////
